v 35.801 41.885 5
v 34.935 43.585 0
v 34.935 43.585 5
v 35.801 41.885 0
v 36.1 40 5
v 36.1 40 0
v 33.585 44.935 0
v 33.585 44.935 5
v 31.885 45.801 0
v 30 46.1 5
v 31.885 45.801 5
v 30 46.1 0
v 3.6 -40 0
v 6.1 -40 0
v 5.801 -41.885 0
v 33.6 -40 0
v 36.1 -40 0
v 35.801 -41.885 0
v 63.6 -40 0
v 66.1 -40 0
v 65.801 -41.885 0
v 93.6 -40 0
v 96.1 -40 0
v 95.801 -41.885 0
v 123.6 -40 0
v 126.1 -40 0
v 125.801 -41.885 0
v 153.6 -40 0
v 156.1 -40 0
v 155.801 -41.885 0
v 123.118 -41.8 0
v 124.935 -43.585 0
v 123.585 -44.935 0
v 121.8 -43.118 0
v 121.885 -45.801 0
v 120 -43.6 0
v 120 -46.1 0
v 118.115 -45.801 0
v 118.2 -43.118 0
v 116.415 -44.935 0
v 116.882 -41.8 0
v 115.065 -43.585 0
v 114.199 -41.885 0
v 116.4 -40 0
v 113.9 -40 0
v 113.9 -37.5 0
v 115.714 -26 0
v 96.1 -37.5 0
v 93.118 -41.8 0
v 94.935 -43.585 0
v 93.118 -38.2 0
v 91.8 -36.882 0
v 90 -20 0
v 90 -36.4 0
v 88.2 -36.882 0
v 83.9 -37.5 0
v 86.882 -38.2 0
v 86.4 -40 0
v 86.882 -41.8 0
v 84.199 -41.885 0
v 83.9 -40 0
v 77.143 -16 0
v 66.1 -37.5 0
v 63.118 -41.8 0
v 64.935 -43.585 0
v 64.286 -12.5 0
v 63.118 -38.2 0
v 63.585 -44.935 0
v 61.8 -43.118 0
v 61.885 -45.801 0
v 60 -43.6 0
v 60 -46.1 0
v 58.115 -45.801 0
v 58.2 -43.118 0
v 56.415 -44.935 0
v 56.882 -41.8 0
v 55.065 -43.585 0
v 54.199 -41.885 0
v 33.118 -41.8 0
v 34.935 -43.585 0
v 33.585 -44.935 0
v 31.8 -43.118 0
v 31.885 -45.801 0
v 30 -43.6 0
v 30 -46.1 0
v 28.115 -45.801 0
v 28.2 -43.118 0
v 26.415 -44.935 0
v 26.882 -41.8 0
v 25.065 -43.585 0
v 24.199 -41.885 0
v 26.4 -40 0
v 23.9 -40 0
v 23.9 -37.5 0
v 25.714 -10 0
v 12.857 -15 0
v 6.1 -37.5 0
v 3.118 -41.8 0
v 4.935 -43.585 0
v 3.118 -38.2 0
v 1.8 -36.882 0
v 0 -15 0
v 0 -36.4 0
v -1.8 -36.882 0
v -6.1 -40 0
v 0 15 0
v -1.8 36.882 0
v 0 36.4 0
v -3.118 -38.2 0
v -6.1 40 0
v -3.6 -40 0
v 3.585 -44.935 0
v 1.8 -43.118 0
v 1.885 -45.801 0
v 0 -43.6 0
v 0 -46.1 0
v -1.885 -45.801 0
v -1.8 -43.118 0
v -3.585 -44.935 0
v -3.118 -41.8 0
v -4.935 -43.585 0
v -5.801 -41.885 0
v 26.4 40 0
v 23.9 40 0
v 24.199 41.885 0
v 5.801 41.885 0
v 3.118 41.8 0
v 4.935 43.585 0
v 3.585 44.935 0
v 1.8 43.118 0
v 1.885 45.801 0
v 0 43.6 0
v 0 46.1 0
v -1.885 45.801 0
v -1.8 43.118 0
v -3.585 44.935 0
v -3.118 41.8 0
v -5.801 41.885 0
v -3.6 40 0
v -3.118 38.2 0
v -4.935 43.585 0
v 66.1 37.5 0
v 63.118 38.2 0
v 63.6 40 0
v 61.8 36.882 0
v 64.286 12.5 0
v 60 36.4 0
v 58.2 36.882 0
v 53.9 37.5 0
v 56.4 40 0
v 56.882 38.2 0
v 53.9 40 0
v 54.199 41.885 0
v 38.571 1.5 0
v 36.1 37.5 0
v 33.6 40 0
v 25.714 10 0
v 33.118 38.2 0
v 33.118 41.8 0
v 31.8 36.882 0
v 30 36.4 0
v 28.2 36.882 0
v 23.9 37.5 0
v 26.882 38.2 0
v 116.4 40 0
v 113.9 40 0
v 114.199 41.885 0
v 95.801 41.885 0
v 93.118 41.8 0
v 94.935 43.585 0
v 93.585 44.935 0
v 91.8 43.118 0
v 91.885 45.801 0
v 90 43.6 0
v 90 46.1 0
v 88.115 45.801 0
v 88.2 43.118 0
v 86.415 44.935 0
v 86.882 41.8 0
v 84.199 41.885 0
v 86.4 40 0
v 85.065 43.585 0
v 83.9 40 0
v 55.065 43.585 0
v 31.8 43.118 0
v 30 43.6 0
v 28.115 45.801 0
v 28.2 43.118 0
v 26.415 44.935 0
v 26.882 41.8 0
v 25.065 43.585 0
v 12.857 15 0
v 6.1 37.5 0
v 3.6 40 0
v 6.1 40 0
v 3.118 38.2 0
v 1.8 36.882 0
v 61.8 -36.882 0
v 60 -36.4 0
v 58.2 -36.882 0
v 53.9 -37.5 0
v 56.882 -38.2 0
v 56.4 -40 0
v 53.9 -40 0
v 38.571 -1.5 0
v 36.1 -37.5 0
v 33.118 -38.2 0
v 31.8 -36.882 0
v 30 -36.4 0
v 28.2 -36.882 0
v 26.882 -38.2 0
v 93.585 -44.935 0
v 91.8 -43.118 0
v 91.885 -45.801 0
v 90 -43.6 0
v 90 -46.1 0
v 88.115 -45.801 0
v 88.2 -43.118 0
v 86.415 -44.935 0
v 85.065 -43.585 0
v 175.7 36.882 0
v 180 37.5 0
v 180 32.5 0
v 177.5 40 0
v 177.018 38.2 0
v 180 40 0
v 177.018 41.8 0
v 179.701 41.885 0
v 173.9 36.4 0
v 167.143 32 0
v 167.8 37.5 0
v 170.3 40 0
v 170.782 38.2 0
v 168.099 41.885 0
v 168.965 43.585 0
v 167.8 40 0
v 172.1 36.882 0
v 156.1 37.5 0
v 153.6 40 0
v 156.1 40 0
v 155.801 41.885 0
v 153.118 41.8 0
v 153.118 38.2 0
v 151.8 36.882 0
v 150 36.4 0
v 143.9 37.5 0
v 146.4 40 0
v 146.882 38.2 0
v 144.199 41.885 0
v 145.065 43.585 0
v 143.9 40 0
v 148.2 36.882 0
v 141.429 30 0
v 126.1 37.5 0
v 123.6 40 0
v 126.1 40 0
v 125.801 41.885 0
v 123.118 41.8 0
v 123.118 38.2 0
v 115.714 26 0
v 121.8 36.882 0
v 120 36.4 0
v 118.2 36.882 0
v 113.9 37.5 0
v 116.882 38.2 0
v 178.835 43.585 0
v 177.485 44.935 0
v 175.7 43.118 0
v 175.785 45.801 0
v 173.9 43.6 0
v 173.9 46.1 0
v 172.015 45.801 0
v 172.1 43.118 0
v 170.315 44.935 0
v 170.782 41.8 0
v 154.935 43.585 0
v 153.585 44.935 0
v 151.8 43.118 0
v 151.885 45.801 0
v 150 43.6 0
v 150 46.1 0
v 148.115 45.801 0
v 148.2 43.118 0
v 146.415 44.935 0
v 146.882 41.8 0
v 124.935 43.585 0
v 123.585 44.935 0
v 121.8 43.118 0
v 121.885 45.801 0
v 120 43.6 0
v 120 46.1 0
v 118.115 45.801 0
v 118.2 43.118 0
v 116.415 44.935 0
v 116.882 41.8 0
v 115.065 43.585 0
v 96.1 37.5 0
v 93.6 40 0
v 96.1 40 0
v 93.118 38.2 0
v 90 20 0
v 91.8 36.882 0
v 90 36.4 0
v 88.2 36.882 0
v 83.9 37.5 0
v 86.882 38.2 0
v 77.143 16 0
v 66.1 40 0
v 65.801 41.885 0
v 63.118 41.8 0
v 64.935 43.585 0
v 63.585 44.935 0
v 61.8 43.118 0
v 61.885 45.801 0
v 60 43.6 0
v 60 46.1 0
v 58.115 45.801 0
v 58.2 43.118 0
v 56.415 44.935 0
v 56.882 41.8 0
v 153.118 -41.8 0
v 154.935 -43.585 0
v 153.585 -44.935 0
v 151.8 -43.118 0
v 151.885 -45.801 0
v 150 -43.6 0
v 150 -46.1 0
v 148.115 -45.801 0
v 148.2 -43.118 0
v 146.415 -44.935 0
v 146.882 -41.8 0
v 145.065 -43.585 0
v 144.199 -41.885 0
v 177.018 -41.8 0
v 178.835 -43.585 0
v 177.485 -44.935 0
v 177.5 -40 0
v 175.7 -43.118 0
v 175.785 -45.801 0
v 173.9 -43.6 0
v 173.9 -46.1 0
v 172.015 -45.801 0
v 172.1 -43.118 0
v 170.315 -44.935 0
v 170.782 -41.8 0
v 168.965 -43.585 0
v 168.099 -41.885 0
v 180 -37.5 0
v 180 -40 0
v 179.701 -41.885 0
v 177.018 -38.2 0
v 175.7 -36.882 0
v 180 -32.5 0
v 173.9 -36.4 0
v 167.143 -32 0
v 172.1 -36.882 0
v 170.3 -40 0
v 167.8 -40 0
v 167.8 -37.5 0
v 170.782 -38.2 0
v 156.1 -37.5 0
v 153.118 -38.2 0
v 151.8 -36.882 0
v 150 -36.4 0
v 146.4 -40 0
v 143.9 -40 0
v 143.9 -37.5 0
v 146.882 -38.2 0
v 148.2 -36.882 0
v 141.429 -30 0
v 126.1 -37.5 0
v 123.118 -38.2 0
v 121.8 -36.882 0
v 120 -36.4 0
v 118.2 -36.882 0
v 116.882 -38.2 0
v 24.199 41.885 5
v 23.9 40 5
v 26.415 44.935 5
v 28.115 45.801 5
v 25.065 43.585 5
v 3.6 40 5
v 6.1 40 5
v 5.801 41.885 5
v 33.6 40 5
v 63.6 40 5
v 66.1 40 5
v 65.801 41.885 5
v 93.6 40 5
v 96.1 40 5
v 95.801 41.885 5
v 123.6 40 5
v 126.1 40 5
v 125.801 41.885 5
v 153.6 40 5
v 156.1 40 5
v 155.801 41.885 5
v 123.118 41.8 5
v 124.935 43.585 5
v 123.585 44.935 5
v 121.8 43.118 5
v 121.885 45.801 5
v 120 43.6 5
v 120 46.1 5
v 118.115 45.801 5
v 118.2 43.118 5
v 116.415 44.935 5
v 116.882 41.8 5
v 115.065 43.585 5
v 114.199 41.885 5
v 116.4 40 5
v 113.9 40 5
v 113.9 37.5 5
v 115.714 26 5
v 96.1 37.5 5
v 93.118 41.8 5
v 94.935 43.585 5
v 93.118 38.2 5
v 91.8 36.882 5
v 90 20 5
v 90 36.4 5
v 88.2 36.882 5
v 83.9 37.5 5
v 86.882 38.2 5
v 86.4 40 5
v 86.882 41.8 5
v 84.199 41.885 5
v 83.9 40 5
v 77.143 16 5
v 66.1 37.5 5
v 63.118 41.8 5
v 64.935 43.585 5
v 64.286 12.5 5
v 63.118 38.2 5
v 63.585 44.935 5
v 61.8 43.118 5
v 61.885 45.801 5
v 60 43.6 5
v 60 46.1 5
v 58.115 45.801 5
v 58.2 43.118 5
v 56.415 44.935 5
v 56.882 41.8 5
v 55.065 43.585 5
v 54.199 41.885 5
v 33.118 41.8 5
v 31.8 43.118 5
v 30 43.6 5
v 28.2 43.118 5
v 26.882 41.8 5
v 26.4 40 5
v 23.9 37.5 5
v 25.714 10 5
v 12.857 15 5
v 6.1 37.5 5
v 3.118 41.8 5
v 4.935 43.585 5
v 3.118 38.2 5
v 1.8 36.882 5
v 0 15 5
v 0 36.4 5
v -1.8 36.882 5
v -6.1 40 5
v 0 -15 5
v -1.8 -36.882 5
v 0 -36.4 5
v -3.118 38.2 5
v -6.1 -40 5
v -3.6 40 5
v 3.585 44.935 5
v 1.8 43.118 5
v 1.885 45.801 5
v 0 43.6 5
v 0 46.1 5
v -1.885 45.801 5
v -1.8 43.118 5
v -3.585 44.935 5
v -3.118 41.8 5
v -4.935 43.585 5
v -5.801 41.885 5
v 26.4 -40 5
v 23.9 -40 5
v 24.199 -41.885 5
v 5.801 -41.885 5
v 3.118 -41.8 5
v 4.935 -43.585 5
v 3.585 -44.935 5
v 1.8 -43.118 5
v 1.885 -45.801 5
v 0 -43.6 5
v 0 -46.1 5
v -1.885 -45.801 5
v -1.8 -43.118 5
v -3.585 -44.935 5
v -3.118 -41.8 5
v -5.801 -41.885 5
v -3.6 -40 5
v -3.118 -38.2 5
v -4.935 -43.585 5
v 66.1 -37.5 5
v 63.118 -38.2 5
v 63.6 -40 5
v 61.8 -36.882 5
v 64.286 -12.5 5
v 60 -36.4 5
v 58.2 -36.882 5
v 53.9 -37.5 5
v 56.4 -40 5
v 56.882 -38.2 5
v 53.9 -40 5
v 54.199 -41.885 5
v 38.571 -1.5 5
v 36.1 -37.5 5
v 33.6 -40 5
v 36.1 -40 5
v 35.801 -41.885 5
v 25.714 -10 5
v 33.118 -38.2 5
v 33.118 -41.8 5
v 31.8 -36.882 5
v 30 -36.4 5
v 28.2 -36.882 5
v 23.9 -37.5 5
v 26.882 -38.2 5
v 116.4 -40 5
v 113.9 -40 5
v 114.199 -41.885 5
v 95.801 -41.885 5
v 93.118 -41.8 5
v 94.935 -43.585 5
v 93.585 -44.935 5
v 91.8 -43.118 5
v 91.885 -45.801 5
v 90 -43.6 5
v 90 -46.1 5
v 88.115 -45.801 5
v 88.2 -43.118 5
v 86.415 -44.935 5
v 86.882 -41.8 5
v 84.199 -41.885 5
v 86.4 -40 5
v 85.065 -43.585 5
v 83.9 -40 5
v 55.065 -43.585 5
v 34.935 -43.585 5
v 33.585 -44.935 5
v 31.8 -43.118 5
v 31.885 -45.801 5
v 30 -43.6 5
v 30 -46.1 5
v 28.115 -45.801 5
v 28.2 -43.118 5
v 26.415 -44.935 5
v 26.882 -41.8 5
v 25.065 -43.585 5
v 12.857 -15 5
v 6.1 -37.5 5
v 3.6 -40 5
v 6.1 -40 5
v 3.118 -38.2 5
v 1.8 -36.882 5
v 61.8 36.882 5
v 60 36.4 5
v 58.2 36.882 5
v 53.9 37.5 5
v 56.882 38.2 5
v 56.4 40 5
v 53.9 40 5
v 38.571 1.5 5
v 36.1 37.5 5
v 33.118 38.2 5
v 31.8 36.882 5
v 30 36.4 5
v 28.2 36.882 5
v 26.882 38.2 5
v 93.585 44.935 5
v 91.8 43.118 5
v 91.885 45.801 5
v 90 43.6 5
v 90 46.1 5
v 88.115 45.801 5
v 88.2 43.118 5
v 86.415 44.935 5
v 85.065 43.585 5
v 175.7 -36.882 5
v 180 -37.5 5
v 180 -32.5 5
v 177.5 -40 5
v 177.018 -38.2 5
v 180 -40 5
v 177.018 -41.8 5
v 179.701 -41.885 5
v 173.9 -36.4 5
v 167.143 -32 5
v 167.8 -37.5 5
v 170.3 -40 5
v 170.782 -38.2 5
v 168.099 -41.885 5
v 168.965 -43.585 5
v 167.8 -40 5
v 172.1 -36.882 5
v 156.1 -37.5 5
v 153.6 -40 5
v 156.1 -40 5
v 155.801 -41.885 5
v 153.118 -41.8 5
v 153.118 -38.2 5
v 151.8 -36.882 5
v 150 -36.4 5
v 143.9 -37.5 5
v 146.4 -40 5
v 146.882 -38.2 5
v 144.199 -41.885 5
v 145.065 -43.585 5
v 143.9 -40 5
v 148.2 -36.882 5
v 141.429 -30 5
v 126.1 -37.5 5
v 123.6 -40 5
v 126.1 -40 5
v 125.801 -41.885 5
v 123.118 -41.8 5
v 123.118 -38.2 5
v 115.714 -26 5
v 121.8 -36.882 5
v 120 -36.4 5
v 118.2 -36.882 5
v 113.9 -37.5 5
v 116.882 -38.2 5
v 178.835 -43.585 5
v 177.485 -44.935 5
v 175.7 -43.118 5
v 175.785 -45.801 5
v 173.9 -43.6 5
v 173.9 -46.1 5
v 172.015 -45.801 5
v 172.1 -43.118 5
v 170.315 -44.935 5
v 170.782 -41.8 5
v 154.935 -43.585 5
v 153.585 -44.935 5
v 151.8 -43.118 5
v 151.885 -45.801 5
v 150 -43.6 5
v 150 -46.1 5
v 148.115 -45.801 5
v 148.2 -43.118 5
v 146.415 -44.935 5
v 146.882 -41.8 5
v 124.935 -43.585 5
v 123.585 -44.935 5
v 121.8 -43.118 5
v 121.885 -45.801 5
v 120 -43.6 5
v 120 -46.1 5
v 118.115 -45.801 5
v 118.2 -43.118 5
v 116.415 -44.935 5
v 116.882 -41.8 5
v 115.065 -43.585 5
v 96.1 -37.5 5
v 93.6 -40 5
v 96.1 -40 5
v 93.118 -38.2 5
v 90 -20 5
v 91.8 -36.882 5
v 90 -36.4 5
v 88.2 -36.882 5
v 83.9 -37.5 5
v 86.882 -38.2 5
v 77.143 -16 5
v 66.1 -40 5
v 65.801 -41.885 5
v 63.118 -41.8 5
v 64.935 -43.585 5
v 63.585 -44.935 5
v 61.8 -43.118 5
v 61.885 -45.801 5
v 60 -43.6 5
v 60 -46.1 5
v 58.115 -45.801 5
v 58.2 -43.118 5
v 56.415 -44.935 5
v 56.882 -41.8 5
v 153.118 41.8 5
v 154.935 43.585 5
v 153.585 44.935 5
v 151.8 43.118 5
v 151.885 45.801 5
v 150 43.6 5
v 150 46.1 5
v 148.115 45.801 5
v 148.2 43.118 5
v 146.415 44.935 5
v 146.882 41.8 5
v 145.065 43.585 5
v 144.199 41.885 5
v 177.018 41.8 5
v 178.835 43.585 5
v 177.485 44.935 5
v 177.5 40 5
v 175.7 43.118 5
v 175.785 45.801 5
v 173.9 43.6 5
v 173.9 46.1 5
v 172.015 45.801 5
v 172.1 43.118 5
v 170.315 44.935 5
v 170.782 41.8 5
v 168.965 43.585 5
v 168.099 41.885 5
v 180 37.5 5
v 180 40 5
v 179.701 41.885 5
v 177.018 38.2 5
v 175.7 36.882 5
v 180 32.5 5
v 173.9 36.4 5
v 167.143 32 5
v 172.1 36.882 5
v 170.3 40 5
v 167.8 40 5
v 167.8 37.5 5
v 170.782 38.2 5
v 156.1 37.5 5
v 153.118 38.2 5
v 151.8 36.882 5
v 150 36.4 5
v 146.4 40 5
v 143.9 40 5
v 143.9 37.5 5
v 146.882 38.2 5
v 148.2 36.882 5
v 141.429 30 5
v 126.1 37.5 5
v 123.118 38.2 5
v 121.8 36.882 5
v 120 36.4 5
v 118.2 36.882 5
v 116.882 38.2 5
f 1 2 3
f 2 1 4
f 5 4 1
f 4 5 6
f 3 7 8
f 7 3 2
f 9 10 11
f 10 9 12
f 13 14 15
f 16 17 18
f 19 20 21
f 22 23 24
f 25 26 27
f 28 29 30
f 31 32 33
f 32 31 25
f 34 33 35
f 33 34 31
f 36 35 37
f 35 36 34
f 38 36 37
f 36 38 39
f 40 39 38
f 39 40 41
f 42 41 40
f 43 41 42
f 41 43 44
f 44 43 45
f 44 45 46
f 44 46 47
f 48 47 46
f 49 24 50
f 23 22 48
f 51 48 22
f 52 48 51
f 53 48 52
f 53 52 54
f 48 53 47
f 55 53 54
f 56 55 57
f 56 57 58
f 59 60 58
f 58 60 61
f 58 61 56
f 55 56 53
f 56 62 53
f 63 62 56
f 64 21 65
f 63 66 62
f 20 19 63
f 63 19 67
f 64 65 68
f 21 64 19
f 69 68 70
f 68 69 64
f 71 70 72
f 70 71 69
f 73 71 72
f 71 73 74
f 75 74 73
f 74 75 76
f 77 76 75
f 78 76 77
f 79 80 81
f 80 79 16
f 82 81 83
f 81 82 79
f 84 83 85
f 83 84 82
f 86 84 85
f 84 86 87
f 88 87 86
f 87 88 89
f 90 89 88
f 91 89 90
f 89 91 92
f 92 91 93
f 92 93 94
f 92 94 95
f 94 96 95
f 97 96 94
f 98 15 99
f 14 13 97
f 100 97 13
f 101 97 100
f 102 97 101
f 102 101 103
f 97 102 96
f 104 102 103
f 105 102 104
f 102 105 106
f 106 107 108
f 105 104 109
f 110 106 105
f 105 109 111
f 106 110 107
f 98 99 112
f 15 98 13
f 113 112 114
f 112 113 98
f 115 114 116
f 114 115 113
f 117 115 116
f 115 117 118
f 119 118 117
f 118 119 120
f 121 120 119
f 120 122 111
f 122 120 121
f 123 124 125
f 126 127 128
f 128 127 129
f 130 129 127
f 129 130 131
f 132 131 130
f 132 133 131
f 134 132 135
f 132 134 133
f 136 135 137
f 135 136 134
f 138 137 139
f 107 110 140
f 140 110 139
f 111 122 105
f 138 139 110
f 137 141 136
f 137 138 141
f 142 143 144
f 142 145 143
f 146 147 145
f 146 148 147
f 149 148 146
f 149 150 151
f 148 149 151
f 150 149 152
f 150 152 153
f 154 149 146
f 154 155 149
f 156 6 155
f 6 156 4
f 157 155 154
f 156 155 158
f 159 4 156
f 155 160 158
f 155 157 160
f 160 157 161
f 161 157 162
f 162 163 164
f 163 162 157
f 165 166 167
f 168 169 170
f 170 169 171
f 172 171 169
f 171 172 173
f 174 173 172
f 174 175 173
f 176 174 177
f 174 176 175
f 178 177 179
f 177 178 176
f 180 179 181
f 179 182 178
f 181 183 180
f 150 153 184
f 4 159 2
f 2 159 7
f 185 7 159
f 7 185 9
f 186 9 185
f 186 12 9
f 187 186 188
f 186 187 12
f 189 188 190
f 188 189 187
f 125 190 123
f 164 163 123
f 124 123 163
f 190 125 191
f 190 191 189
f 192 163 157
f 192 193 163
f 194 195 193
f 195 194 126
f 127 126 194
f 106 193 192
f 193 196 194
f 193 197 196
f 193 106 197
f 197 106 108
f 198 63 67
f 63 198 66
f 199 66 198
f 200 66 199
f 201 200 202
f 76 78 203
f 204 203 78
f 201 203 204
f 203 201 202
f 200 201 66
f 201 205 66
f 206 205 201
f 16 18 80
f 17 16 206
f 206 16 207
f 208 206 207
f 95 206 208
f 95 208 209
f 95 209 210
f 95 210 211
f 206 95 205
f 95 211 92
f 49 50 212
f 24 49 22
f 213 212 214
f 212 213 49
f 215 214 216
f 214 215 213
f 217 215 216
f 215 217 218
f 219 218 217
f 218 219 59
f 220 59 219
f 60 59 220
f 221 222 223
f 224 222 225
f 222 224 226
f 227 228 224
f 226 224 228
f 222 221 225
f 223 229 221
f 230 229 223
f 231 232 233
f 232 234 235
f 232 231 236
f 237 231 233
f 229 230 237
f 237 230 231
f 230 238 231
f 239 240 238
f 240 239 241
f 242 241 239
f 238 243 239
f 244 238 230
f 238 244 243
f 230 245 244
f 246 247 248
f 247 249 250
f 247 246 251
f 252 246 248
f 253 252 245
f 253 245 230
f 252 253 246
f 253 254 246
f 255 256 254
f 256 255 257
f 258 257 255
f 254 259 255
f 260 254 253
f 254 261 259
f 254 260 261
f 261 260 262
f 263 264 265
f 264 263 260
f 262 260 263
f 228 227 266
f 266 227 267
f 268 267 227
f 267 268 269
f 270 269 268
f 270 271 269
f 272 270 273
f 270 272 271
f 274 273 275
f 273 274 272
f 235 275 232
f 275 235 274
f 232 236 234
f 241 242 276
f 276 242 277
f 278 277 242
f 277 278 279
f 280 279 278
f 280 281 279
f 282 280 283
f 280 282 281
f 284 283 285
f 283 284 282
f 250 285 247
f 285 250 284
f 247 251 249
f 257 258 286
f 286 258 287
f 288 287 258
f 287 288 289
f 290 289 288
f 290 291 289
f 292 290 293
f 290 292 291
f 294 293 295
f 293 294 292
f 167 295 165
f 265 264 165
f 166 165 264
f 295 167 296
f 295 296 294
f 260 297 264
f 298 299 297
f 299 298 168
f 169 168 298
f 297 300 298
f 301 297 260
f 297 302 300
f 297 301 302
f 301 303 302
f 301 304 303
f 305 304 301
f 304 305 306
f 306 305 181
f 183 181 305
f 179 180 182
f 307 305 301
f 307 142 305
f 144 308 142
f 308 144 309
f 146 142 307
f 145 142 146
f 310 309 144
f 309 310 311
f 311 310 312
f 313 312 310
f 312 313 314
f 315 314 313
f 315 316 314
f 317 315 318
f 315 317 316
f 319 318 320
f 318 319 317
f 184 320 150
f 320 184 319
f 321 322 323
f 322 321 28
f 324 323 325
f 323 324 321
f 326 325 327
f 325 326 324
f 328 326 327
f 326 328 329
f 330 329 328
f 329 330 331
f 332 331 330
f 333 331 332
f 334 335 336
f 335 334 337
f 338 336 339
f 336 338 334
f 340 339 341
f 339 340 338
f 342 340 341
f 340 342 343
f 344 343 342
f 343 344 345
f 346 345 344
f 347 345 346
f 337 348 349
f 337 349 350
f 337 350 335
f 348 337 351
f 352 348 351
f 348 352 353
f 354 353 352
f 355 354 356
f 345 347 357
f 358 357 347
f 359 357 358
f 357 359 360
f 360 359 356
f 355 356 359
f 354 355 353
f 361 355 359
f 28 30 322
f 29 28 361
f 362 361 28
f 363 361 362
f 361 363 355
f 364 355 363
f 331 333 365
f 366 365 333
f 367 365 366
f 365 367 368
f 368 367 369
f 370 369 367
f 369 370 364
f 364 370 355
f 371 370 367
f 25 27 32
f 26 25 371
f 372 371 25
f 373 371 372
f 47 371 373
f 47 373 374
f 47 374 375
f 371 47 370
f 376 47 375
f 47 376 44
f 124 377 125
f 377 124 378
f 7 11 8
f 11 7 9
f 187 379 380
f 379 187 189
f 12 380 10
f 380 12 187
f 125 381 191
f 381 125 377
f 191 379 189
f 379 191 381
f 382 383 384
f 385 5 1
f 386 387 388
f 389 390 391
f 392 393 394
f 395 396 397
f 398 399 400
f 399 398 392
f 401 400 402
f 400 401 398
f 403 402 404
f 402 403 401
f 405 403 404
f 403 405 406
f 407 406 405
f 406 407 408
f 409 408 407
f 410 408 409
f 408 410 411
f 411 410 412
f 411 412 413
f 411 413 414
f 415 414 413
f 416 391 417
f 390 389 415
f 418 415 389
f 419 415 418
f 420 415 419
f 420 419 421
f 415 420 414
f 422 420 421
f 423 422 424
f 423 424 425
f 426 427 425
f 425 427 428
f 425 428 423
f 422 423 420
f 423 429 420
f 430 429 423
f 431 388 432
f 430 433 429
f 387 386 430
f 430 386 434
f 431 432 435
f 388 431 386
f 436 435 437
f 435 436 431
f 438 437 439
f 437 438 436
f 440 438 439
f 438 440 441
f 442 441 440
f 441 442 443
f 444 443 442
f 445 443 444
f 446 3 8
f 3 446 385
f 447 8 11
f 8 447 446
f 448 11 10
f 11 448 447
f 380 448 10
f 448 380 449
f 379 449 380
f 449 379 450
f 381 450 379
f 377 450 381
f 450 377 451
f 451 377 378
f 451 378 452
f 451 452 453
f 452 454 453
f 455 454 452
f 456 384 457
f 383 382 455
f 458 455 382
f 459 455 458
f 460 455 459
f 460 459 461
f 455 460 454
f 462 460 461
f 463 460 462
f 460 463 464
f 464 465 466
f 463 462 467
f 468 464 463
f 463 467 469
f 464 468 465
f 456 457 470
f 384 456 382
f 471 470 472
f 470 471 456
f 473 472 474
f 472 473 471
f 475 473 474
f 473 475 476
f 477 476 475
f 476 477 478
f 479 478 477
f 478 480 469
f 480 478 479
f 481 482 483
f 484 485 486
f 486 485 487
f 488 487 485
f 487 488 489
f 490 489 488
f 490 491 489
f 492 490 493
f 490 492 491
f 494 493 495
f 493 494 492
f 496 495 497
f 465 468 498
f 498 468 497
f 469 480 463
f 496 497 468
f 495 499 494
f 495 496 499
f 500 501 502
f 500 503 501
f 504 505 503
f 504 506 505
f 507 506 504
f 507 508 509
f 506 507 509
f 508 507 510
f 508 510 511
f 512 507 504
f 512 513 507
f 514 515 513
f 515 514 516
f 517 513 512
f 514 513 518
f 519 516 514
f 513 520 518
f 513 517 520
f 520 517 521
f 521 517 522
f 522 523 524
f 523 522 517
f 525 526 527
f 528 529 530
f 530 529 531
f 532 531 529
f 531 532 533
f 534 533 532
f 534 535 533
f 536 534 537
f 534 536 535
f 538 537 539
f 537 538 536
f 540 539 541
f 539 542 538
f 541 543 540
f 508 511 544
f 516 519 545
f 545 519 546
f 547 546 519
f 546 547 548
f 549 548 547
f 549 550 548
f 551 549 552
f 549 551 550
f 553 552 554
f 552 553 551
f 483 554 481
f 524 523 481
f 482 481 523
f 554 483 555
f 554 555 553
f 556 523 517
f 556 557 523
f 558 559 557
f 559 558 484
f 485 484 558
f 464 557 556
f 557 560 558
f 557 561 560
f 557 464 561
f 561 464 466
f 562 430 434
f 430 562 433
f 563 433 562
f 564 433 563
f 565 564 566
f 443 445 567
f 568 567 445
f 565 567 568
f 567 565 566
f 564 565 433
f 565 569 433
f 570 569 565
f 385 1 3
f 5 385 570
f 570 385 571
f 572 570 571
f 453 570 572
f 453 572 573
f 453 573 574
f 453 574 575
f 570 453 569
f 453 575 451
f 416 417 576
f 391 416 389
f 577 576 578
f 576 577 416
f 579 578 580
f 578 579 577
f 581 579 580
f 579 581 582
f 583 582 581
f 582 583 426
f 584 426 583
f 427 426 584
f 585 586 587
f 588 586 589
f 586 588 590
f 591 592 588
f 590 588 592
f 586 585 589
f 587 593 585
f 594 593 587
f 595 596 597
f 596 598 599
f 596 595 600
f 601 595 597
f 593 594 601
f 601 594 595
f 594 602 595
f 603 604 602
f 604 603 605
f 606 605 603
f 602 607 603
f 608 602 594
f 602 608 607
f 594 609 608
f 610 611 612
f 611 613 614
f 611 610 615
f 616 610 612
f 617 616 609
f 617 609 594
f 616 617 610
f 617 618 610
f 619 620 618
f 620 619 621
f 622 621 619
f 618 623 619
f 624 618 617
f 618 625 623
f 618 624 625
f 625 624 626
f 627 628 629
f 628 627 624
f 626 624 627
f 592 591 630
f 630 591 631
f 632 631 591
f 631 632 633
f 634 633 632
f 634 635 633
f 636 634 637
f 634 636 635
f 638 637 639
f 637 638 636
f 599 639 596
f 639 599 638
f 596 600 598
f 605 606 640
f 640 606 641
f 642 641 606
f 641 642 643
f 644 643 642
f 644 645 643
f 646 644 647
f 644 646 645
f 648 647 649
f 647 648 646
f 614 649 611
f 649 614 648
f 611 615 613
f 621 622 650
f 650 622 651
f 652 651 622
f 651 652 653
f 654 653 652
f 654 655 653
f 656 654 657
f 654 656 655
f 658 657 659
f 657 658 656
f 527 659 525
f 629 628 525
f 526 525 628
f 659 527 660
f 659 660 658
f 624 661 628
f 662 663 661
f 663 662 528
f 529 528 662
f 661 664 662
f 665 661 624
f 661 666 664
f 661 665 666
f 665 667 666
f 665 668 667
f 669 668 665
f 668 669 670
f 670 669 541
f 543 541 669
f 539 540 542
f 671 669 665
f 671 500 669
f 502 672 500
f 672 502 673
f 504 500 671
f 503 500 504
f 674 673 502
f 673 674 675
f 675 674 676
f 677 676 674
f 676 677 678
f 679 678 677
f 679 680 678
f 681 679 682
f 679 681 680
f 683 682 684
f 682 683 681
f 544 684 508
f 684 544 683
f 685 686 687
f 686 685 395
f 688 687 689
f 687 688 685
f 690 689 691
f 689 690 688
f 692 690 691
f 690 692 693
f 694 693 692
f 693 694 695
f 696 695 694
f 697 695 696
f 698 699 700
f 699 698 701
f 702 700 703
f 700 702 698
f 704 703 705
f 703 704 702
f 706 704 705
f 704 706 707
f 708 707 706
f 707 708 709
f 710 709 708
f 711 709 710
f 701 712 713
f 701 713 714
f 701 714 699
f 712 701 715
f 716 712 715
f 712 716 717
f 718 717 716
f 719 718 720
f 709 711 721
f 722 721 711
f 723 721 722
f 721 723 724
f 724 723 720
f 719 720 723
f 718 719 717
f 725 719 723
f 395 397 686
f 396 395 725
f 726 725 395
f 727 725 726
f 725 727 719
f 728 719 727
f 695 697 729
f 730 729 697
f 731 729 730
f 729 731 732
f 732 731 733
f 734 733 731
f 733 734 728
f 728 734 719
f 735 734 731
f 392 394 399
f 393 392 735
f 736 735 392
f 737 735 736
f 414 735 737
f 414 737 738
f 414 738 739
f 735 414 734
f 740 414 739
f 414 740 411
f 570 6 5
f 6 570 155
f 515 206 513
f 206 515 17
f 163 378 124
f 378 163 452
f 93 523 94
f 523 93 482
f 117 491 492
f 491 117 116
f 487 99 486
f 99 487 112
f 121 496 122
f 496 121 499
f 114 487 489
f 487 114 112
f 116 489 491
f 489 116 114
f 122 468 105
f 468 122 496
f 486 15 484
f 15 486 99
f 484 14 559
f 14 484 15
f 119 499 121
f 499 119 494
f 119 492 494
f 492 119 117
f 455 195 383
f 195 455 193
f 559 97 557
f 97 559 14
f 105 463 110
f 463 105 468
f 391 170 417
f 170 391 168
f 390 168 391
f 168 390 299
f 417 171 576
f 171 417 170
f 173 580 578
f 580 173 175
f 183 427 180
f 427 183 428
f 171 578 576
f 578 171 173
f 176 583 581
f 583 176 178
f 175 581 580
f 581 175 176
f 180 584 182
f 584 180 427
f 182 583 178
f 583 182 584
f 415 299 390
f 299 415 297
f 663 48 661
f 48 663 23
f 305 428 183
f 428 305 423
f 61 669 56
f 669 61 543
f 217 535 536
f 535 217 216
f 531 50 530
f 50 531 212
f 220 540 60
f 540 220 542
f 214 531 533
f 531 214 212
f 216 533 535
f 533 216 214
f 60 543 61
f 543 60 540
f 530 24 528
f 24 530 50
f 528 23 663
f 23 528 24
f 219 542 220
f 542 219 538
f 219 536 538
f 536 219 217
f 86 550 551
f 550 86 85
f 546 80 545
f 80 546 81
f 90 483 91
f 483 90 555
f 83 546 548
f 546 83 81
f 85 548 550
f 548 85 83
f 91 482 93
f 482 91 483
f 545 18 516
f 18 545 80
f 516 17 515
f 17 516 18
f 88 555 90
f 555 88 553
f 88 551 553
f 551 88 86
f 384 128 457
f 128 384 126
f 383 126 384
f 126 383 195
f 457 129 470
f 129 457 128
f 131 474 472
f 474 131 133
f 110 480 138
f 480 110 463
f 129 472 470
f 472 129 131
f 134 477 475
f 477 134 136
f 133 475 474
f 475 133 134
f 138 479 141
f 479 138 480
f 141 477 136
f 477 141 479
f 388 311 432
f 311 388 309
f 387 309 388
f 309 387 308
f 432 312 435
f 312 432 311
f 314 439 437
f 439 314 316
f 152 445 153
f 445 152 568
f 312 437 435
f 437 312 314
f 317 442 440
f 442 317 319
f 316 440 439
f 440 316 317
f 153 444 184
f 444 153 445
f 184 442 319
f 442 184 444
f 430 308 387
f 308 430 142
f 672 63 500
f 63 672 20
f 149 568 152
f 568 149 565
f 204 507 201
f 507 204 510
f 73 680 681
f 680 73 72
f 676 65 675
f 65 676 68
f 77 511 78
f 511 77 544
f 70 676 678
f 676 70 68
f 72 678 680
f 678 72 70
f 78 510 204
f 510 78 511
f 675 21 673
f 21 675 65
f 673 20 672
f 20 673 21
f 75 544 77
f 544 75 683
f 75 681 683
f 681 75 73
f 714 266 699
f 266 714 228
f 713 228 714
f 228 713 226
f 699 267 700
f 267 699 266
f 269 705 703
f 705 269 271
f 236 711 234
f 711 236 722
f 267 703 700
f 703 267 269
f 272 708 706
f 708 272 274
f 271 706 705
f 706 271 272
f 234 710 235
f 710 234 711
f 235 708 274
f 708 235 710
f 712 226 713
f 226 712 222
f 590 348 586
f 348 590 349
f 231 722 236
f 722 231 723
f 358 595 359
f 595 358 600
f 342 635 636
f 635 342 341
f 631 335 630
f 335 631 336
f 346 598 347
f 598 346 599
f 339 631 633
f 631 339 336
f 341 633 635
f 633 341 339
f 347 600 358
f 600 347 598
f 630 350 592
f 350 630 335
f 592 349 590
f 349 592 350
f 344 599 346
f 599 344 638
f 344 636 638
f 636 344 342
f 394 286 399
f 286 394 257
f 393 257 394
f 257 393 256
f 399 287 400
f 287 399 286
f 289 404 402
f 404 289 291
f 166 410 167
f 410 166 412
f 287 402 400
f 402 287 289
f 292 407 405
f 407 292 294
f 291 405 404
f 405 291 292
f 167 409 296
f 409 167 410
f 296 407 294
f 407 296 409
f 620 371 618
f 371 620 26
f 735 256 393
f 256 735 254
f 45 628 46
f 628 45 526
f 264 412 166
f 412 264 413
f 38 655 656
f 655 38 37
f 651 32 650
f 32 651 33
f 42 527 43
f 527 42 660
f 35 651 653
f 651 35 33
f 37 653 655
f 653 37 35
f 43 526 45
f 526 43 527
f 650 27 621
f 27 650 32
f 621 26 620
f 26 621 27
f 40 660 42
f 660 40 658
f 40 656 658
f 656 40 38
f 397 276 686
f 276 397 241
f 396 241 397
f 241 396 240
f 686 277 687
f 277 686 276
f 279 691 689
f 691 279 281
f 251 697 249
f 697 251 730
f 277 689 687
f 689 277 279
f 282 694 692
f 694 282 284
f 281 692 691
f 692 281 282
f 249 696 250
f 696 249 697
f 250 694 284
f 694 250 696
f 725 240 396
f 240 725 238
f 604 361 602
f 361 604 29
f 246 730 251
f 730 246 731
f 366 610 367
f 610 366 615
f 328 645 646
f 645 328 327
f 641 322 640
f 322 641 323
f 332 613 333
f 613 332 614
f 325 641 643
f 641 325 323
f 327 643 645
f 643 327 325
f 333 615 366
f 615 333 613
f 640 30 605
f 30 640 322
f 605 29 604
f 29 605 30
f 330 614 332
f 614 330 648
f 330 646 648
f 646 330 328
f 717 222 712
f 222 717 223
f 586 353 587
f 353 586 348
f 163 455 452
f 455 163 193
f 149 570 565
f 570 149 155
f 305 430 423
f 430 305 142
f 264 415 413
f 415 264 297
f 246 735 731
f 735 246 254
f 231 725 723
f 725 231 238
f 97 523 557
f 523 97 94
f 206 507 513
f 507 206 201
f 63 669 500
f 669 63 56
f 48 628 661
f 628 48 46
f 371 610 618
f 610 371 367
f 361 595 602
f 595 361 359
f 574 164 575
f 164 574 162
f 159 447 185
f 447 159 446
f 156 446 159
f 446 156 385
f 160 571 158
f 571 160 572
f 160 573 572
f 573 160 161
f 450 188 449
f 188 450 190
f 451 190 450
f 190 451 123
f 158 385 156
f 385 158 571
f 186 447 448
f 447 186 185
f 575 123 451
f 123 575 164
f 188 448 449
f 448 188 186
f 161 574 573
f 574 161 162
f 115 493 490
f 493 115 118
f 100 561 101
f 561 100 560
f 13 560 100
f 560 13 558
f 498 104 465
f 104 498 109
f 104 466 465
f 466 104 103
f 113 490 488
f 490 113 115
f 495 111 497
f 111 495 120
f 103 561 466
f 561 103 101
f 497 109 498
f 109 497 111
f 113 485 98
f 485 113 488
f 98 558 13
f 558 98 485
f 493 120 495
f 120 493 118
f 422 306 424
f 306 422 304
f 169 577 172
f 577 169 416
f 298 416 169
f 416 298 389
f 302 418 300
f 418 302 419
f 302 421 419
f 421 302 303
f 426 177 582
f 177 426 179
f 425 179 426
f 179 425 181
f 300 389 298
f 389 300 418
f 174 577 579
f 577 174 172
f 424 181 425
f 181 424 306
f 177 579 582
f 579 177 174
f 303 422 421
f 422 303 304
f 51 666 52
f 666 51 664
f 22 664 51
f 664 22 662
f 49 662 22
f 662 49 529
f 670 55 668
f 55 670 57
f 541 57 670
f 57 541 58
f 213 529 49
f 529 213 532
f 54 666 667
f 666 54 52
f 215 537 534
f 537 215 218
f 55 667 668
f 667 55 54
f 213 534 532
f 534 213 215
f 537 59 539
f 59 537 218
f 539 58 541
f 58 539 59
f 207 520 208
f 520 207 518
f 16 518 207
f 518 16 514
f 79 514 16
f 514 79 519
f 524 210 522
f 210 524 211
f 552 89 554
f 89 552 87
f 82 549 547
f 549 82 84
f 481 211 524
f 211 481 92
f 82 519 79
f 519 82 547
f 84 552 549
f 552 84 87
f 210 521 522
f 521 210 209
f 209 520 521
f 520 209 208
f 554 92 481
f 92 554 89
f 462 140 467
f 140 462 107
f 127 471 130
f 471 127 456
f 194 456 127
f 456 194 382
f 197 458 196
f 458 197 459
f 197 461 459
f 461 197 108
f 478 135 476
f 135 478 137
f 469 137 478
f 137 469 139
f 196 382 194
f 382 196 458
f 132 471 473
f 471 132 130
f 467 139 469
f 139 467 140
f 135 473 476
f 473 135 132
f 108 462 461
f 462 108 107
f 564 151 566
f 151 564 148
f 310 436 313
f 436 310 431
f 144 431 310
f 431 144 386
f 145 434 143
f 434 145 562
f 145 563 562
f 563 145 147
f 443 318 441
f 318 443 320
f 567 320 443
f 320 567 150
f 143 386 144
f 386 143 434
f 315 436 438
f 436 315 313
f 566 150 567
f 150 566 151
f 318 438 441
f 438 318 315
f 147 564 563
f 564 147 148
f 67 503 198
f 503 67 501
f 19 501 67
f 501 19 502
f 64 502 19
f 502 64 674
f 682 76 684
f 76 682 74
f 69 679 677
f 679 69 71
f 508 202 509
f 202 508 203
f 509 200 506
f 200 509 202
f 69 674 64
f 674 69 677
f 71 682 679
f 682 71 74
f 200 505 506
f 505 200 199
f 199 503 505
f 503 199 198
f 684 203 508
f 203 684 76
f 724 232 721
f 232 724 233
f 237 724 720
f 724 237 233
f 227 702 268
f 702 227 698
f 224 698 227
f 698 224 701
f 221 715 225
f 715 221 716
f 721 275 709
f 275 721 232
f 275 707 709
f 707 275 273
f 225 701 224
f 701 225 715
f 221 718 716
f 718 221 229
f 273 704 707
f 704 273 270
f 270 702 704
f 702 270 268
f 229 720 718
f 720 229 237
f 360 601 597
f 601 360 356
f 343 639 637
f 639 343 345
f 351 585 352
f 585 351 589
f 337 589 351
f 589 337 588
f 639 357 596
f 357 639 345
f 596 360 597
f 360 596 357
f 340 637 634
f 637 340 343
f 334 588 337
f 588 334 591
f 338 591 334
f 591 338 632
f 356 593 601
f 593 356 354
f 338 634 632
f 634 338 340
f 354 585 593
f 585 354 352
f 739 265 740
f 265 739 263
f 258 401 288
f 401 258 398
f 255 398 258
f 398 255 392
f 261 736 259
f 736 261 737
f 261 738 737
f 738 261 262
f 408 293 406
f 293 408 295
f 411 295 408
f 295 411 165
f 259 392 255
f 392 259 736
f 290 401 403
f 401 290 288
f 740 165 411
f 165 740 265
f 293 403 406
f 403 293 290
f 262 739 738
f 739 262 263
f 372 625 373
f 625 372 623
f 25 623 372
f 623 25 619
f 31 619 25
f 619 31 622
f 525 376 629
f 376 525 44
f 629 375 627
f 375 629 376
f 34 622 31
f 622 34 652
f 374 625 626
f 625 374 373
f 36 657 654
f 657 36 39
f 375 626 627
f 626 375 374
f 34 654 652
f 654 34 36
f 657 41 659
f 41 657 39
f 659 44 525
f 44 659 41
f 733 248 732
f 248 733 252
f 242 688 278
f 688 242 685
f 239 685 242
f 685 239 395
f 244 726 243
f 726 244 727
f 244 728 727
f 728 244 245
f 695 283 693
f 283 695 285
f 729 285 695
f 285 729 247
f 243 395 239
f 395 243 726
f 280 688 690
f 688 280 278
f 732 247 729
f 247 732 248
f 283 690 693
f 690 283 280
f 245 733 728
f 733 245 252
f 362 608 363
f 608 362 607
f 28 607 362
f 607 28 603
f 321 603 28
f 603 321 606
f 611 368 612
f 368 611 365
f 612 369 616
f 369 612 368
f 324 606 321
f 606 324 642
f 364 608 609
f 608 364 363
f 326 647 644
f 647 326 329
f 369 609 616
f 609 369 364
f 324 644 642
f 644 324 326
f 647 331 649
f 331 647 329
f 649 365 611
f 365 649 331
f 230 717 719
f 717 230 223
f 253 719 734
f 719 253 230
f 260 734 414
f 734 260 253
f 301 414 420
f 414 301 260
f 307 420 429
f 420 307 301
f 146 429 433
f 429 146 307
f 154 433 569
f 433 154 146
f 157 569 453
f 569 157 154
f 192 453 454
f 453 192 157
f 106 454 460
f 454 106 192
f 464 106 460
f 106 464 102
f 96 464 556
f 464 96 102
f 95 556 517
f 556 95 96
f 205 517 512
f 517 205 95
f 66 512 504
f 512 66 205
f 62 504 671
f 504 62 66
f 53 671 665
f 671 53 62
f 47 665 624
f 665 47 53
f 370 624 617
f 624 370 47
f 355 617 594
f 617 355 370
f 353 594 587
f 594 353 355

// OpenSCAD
/* Convergent-Divergent 2D Nozzle
 * Designed for Dr. Kayuza Tajiri
 * Adjust the List to adjust the Curve
 * Written by Jacob Loss
 */

/* ====== Includes ====== */
include <Libs/tsmthread4.scad>

/* ====== User Defined Values ====== */

/* Geometry of Nozzle centered around the center-line of the nozzle.
 * Geometry is defined from Convergent (input) to Divergent (output) side
 *      GasIn -> x -> GasOut
 *  Ex. [10, 10, 5, 3, 1.5, 1.5, 4, 6, 8, 9, 10, 11, 12]
 * Size of frame is defined by the end value like so:
 *      width = 2 * (end + t)
 *  Where <t> is the minimum wall thickness value.
 */
nozzle_geo = [15, 15, 10, 1.5, 7, 12.5, 16, 20, 23, 26, 28, 30, 31, 32, 32.5];

/* Length of the nozzle piece */
nozzle_length = 180;

/* Minimum Thickness of the walls along the nozzle geometry */
wall_thickness = 5;

/* Thickness in the z direction of the nozzle piece */
noz_vert_thickness = 5;

/* Thickness in the z direction of the inlet piece */
inlet_vert_thickness = 5;

/* ==== Inlet Values ==== */
/* Currently threads only support NPT for inlet. */
/* NPT Thread parameters are in inches */

/* Inlet Thickness */
inlet_thickness = 2.5;

/* Inlet Diameter */
/* Note: this is NOT the same as the pipe diameter */
inlet_dia = 0.54;   // Default for 1/4" pipe threads

/* Inlet Length in Inches */
inlet_len = 1/2;

/* Inlet Thread Pitch */
inlet_pitch = 0.05556; // Defualt pitch for 1/4" pipe threads

/* Inlet Gender */
inlet_male = false; // Male = true, Female = false.

/* Inner Diameter of inlet */
/* Note: this value is only used on male connectors */
inlet_inner_dia = inlet_dia * 0.66; // Just an example

/* Number of mounting points on the inlet */
/* Automajically aligns mounting points to the nozzle */
inlet_mounting_points = 4;

/* ==== Mounting Values ==== */

/* Mouting Hole centers
 * All values relative to the center back of the nozzle.
 * Start with values closest to the inlet
 */
mount_points = [
        [30, 40, 0],
        [0, -40, 0],
        [90, 40, 0],
        [90, -40, 0],
        [30, -40, 0],
        [0, 40, 0],
        [60, 40, 0],
        [60, -40, 0],
        [173.9, 40, 0],
        [173.9, -40, 0],
        [120, 40, 0],
        [120, -40, 0],
        [150, 40, 0],
        [150, -40, 0]
    ];

/* Mouting hole diameter */
mount_dia = 7; 

/* Thickness of walls around mount points */
mount_wall_thickness = 5;

/* Mounting Tolerance */
mount_tolerance = 0.2;

/* ==== Extra Features ==== */

/* Minimize Plastic use
 * Will use less plastic by cutting out square structure that is unnecessary.
 * Still follows minimum wall thickness for the nozzle
 * Will extend arms to defined mounting points as necessary
 */
min_plas = true;

/* Adds a sealing groove along the edge of the nozzle. 
 * This can be filled with rubber to help maintain a seal.
 */
sealing_groove = false;

/* Sealing Details
 * Not used if sealing_groove=false
 */
seal_dia = 2;       // Diameter of seal groove
seal_dist = 0.5;    // Distance seal groove is from wall edge

/* ====== Calculated Values ====== */

/* Length of outside frame */
frame_length = nozzle_length + wall_thickness;

/* Width of outside frame */
frame_width = 2*max(nozzle_geo) + 2 * wall_thickness;

/* Full frame dims */
frame = [frame_length, frame_width, noz_vert_thickness];

/* Expanded Nozzle Profile */
big_nozzle_geo = [ for(i = [0:len(nozzle_geo)-1]) nozzle_geo[i] + wall_thickness];



/* Inlet Block Dimensions */
inlet_frame = [min(extract_x(mount_points)) 
                +(mount_dia+mount_tolerance+mount_wall_thickness)/2 
                + wall_thickness,
                frame_width, 
                inlet_thickness];

/* ====== Functions ====== */

/* Extracts the X value for list of 3D coords */
function extract_x(list) = [
    for(i = [0:len(list)-1])
    list[i][0]  // Extract X
    ];
    
// input : list of numbers
// output : sorted list of numbers
function quicksort_x(arr) = !(len(arr)>0) ? [] : let(
    pivot   = arr[floor(len(arr)/2)],
    lesser  = [ for (y = arr) if (y  < pivot) y ],
    equal   = [ for (y = arr) if (y == pivot) y ],
    greater = [ for (y = arr) if (y  > pivot) y ]
) concat(
    quicksort_x(lesser), equal, quicksort_x(greater)
);

/* ====== Modules ====== */

/* Make Nozzle Difference Geometry 
 * 
 *  Makes the Positive Nozzle geometry for use as a difference value.
 *  Is used in minimize plastic mode to define the shape of the frame.
 */
module make_nozzle_diff_geo(
    nozzle_geo, 
    nozzle_length, 
    noz_vert_thickness){
    // Make Nozzle Geometry
    inc = nozzle_length / (len(nozzle_geo)-1);
    geo1 =  [ for(i = [0 : len(nozzle_geo)-1]) 
                [i * inc, nozzle_geo[i]]
            ];

    geo2 = [ for(i = [0 : len(nozzle_geo)-1])
                let(i = len(nozzle_geo)-1 - i)
                [i * inc, -nozzle_geo[i]]
            ];
    big_nozzle_geo = [ for(i = [0:len(nozzle_geo)-1]) nozzle_geo[i] + wall_thickness];
    geo = concat(geo1, geo2);
    //echo(geo);
    linear_extrude(height = noz_vert_thickness)
    polygon(geo);
}

module make_mounting_points(mounting_points, mount_dia, mount_wall_thickness, mount_tolerance, mount_thickness){
    for(i = [0:len(mounting_points)-1]){
        translate(mounting_points[i])
        union(){
            cylinder(h = mount_thickness, d = mount_dia+mount_tolerance+mount_wall_thickness);
            translate([0, -mounting_points[i][1]/2, mount_thickness/2])
            cube([
                    mount_dia+mount_tolerance+mount_wall_thickness, 
                    abs(mounting_points[i][1]), 
                    mount_thickness
                ], center = true);
        }
    }
}

module make_mounting_drills(mounting_points, mount_dia, mount_thickness, mount_tolerance){
    for(i = [0:len(mounting_points)-1]){
        translate(mounting_points[i])
        cylinder(h = mount_thickness, d = mount_dia+mount_tolerance);
    }
}

module build_nozzle_frame(
    frame,
    nozzle_length, 
    big_nozzle_geo,
    wall_thickness,
    noz_vert_thickness,
    min_plas,
    mount_points, 
    mount_dia, 
    mount_wall_thickness, 
    mount_tolerance){
    if(min_plas){
        butt_dims = [wall_thickness, 2 * big_nozzle_geo[0], noz_vert_thickness];
            union(){
                translate([-wall_thickness/2, 0, noz_vert_thickness/2])
                cube(butt_dims, center = true);
                make_nozzle_diff_geo(big_nozzle_geo, nozzle_length, noz_vert_thickness);
                make_mounting_points(mount_points, mount_dia, mount_wall_thickness, mount_tolerance, noz_vert_thickness);
            }

    } else {
            union(){
                translate([-wall_thickness, -frame[1]/2, 0])
                cube(frame);
                make_mounting_points(mount_points, mount_dia, mount_wall_thickness, mount_tolerance, noz_vert_thickness);
            }
    }   
    
}

module build_nozzle(
    frame, 
    wall_thickness, 
    min_plas = false, 
    sealing_groove = false, 
    nozzle_geo, 
    nozzle_length, 
    noz_vert_thickness,
    big_nozzle_geo,
    mount_points, 
    mount_dia, 
    mount_wall_thickness, 
    mount_tolerance
    ){
    difference(){
        build_nozzle_frame(
            frame,
            nozzle_length, 
            big_nozzle_geo,
            wall_thickness,
            noz_vert_thickness,
            min_plas,
            mount_points, 
            mount_dia, 
            mount_wall_thickness, 
            mount_tolerance);
     make_nozzle_diff_geo(nozzle_geo, nozzle_length, noz_vert_thickness);
     make_mounting_drills(mount_points, mount_dia, noz_vert_thickness, mount_tolerance);
    }
}

module build_inlet_frame(
    frame,
    wall_thickness,
    min_plas, 
    big_nozzle_geo, 
    nozzle_length, 
    noz_vert_thickness,
    big_nozzle_geo,
    mount_points, 
    mount_dia, 
    mount_wall_thickness, 
    mount_tolerance,
    inlet_thickness,
    inlet_mounting_points){
    sorted_x = quicksort_x(extract_x(mount_points));
    /* Max X value that needs to be included */
    max_x = sorted_x[inlet_mounting_points-1] 
        + wall_thickness 
        + (mount_dia + mount_tolerance + mount_wall_thickness)/2;
    
    intersection(){
        translate([max_x/2-wall_thickness, 0, inlet_thickness/2])
        cube([max_x, 1000, inlet_thickness], center=true);
        difference(){
        build_nozzle_frame(
            frame=frame, 
            wall_thickness=wall_thickness, 
            min_plas=min_plas, 
            big_nozzle_geo=nozzle_geo, 
            nozzle_length = nozzle_length, 
            noz_vert_thickness = inlet_thickness,
            big_nozzle_geo = big_nozzle_geo,
            mount_points = mount_points, 
            mount_dia = mount_dia, 
            mount_wall_thickness = mount_wall_thickness, 
            mount_tolerance = mount_tolerance);
            
            make_mounting_drills(mount_points, mount_dia, noz_vert_thickness, mount_tolerance);
        }
    }
}

module build_inlet_block(
    big_nozzle_geo,
    inlet_thickness,
    wall_thickness,
    mount_points, 
    mount_dia, 
    mount_wall_thickness, 
    mount_tolerance, 
    noz_vert_thickness,
    min_plas=false,
    inlet_mounting_points,
    inlet_dia,
    inlet_pitch,
    inlet_male,
    inlet_inner_dia,
    inlet_len){
        
    // Z-lift noz_vert_thickness+inlet_thickness/2
    
    frame = [frame_length, frame_width, inlet_thickness];
    if(inlet_male){
        difference(){
        union(){
            build_inlet_frame(
                    frame=frame, 
                    wall_thickness=wall_thickness, 
                    min_plas=min_plas, 
                    big_nozzle_geo=nozzle_geo, 
                    nozzle_length = nozzle_length, 
                    noz_vert_thickness = inlet_thickness,
                    big_nozzle_geo = big_nozzle_geo,
                    mount_points = mount_points, 
                    mount_dia = mount_dia, 
                    mount_wall_thickness = mount_wall_thickness, 
                    mount_tolerance = mount_tolerance,
                    inlet_thickness = inlet_thickness,
                    inlet_mounting_points = inlet_mounting_points);
            
                translate([wall_thickness + (inlet_dia + $OD_COMP)/(2*0.0393701), 0, inlet_thickness]){
                imperial(){
                    thread_npt(DMAJ=inlet_dia + $OD_COMP,L = inlet_len,PITCH = inlet_pitch);
                }
            }
        }
            /* Male Connector */
            translate([wall_thickness + (inlet_dia + $OD_COMP)/(2*0.0393701), 0, 0])
            cylinder(h = inlet_len / 0.0393701 + inlet_thickness, r = inlet_inner_dia / (2 * 0.0393701)); 
        }
    } else {
        difference(){
        union(){
            build_inlet_frame(
                        frame=frame, 
                        wall_thickness=wall_thickness, 
                        min_plas=min_plas, 
                        big_nozzle_geo=nozzle_geo, 
                        nozzle_length = nozzle_length, 
                        noz_vert_thickness = inlet_thickness,
                        big_nozzle_geo = big_nozzle_geo,
                        mount_points = mount_points, 
                        mount_dia = mount_dia, 
                        mount_wall_thickness = mount_wall_thickness, 
                        mount_tolerance = mount_tolerance,
                        inlet_thickness = inlet_thickness,
                        inlet_mounting_points = inlet_mounting_points);
            translate([wall_thickness + (inlet_dia + $OD_COMP)/(2*0.0393701), 0, inlet_thickness])
            cylinder(h = inlet_len / 0.0393701, r = (inlet_dia + $OD_COMP)/ (1 * 0.0393701)+ mount_wall_thickness, $fn = 6);
        }
        translate([wall_thickness + (inlet_dia + $OD_COMP)/(2*0.0393701), 0, inlet_thickness]){
                imperial(){
                    thread_npt(DMAJ=inlet_dia - $OD_COMP,L = inlet_len+1,PITCH = inlet_pitch);
                }
                
            }
            translate([wall_thickness + (inlet_dia + $OD_COMP)/(2*0.0393701), 0, 0])
            cylinder(h = inlet_thickness, r = inlet_inner_dia / (2 * 0.0393701));
        }
    }
}

module test(){
    
    
    build_nozzle(
        frame=frame, 
        wall_thickness=wall_thickness, 
        min_plas=false, 
        nozzle_geo=nozzle_geo, 
        nozzle_length = nozzle_length, 
        noz_vert_thickness = noz_vert_thickness,
        big_nozzle_geo = big_nozzle_geo,
        mount_points = mount_points, 
        mount_dia = mount_dia, 
        mount_wall_thickness = mount_wall_thickness, 
        mount_tolerance = mount_tolerance);
    
    
    //translate([0, 0, noz_vert_thickness])
    //rotate([0, 0, 0])
    
    /*
    build_inlet_block(
    wall_thickness=wall_thickness,
    inlet_thickness = 2.5,
    big_nozzle_geo = big_nozzle_geo,
    mount_points = mount_points, 
    mount_dia = mount_dia, 
    mount_wall_thickness = mount_wall_thickness, 
    mount_tolerance = mount_tolerance, 
    noz_vert_thickness = noz_vert_thickness,
    min_plas=true,
    inlet_mounting_points=inlet_mounting_points,
    inlet_dia = inlet_dia,
    inlet_pitch = inlet_pitch,
    inlet_male = true,
    inlet_inner_dia = inlet_inner_dia,
    inlet_len = inlet_len);
    */
    
}
/*
echo(mount_points);
echo(quicksort_x(extract_x(mount_points)));
*/
/* Test all values */
test();
